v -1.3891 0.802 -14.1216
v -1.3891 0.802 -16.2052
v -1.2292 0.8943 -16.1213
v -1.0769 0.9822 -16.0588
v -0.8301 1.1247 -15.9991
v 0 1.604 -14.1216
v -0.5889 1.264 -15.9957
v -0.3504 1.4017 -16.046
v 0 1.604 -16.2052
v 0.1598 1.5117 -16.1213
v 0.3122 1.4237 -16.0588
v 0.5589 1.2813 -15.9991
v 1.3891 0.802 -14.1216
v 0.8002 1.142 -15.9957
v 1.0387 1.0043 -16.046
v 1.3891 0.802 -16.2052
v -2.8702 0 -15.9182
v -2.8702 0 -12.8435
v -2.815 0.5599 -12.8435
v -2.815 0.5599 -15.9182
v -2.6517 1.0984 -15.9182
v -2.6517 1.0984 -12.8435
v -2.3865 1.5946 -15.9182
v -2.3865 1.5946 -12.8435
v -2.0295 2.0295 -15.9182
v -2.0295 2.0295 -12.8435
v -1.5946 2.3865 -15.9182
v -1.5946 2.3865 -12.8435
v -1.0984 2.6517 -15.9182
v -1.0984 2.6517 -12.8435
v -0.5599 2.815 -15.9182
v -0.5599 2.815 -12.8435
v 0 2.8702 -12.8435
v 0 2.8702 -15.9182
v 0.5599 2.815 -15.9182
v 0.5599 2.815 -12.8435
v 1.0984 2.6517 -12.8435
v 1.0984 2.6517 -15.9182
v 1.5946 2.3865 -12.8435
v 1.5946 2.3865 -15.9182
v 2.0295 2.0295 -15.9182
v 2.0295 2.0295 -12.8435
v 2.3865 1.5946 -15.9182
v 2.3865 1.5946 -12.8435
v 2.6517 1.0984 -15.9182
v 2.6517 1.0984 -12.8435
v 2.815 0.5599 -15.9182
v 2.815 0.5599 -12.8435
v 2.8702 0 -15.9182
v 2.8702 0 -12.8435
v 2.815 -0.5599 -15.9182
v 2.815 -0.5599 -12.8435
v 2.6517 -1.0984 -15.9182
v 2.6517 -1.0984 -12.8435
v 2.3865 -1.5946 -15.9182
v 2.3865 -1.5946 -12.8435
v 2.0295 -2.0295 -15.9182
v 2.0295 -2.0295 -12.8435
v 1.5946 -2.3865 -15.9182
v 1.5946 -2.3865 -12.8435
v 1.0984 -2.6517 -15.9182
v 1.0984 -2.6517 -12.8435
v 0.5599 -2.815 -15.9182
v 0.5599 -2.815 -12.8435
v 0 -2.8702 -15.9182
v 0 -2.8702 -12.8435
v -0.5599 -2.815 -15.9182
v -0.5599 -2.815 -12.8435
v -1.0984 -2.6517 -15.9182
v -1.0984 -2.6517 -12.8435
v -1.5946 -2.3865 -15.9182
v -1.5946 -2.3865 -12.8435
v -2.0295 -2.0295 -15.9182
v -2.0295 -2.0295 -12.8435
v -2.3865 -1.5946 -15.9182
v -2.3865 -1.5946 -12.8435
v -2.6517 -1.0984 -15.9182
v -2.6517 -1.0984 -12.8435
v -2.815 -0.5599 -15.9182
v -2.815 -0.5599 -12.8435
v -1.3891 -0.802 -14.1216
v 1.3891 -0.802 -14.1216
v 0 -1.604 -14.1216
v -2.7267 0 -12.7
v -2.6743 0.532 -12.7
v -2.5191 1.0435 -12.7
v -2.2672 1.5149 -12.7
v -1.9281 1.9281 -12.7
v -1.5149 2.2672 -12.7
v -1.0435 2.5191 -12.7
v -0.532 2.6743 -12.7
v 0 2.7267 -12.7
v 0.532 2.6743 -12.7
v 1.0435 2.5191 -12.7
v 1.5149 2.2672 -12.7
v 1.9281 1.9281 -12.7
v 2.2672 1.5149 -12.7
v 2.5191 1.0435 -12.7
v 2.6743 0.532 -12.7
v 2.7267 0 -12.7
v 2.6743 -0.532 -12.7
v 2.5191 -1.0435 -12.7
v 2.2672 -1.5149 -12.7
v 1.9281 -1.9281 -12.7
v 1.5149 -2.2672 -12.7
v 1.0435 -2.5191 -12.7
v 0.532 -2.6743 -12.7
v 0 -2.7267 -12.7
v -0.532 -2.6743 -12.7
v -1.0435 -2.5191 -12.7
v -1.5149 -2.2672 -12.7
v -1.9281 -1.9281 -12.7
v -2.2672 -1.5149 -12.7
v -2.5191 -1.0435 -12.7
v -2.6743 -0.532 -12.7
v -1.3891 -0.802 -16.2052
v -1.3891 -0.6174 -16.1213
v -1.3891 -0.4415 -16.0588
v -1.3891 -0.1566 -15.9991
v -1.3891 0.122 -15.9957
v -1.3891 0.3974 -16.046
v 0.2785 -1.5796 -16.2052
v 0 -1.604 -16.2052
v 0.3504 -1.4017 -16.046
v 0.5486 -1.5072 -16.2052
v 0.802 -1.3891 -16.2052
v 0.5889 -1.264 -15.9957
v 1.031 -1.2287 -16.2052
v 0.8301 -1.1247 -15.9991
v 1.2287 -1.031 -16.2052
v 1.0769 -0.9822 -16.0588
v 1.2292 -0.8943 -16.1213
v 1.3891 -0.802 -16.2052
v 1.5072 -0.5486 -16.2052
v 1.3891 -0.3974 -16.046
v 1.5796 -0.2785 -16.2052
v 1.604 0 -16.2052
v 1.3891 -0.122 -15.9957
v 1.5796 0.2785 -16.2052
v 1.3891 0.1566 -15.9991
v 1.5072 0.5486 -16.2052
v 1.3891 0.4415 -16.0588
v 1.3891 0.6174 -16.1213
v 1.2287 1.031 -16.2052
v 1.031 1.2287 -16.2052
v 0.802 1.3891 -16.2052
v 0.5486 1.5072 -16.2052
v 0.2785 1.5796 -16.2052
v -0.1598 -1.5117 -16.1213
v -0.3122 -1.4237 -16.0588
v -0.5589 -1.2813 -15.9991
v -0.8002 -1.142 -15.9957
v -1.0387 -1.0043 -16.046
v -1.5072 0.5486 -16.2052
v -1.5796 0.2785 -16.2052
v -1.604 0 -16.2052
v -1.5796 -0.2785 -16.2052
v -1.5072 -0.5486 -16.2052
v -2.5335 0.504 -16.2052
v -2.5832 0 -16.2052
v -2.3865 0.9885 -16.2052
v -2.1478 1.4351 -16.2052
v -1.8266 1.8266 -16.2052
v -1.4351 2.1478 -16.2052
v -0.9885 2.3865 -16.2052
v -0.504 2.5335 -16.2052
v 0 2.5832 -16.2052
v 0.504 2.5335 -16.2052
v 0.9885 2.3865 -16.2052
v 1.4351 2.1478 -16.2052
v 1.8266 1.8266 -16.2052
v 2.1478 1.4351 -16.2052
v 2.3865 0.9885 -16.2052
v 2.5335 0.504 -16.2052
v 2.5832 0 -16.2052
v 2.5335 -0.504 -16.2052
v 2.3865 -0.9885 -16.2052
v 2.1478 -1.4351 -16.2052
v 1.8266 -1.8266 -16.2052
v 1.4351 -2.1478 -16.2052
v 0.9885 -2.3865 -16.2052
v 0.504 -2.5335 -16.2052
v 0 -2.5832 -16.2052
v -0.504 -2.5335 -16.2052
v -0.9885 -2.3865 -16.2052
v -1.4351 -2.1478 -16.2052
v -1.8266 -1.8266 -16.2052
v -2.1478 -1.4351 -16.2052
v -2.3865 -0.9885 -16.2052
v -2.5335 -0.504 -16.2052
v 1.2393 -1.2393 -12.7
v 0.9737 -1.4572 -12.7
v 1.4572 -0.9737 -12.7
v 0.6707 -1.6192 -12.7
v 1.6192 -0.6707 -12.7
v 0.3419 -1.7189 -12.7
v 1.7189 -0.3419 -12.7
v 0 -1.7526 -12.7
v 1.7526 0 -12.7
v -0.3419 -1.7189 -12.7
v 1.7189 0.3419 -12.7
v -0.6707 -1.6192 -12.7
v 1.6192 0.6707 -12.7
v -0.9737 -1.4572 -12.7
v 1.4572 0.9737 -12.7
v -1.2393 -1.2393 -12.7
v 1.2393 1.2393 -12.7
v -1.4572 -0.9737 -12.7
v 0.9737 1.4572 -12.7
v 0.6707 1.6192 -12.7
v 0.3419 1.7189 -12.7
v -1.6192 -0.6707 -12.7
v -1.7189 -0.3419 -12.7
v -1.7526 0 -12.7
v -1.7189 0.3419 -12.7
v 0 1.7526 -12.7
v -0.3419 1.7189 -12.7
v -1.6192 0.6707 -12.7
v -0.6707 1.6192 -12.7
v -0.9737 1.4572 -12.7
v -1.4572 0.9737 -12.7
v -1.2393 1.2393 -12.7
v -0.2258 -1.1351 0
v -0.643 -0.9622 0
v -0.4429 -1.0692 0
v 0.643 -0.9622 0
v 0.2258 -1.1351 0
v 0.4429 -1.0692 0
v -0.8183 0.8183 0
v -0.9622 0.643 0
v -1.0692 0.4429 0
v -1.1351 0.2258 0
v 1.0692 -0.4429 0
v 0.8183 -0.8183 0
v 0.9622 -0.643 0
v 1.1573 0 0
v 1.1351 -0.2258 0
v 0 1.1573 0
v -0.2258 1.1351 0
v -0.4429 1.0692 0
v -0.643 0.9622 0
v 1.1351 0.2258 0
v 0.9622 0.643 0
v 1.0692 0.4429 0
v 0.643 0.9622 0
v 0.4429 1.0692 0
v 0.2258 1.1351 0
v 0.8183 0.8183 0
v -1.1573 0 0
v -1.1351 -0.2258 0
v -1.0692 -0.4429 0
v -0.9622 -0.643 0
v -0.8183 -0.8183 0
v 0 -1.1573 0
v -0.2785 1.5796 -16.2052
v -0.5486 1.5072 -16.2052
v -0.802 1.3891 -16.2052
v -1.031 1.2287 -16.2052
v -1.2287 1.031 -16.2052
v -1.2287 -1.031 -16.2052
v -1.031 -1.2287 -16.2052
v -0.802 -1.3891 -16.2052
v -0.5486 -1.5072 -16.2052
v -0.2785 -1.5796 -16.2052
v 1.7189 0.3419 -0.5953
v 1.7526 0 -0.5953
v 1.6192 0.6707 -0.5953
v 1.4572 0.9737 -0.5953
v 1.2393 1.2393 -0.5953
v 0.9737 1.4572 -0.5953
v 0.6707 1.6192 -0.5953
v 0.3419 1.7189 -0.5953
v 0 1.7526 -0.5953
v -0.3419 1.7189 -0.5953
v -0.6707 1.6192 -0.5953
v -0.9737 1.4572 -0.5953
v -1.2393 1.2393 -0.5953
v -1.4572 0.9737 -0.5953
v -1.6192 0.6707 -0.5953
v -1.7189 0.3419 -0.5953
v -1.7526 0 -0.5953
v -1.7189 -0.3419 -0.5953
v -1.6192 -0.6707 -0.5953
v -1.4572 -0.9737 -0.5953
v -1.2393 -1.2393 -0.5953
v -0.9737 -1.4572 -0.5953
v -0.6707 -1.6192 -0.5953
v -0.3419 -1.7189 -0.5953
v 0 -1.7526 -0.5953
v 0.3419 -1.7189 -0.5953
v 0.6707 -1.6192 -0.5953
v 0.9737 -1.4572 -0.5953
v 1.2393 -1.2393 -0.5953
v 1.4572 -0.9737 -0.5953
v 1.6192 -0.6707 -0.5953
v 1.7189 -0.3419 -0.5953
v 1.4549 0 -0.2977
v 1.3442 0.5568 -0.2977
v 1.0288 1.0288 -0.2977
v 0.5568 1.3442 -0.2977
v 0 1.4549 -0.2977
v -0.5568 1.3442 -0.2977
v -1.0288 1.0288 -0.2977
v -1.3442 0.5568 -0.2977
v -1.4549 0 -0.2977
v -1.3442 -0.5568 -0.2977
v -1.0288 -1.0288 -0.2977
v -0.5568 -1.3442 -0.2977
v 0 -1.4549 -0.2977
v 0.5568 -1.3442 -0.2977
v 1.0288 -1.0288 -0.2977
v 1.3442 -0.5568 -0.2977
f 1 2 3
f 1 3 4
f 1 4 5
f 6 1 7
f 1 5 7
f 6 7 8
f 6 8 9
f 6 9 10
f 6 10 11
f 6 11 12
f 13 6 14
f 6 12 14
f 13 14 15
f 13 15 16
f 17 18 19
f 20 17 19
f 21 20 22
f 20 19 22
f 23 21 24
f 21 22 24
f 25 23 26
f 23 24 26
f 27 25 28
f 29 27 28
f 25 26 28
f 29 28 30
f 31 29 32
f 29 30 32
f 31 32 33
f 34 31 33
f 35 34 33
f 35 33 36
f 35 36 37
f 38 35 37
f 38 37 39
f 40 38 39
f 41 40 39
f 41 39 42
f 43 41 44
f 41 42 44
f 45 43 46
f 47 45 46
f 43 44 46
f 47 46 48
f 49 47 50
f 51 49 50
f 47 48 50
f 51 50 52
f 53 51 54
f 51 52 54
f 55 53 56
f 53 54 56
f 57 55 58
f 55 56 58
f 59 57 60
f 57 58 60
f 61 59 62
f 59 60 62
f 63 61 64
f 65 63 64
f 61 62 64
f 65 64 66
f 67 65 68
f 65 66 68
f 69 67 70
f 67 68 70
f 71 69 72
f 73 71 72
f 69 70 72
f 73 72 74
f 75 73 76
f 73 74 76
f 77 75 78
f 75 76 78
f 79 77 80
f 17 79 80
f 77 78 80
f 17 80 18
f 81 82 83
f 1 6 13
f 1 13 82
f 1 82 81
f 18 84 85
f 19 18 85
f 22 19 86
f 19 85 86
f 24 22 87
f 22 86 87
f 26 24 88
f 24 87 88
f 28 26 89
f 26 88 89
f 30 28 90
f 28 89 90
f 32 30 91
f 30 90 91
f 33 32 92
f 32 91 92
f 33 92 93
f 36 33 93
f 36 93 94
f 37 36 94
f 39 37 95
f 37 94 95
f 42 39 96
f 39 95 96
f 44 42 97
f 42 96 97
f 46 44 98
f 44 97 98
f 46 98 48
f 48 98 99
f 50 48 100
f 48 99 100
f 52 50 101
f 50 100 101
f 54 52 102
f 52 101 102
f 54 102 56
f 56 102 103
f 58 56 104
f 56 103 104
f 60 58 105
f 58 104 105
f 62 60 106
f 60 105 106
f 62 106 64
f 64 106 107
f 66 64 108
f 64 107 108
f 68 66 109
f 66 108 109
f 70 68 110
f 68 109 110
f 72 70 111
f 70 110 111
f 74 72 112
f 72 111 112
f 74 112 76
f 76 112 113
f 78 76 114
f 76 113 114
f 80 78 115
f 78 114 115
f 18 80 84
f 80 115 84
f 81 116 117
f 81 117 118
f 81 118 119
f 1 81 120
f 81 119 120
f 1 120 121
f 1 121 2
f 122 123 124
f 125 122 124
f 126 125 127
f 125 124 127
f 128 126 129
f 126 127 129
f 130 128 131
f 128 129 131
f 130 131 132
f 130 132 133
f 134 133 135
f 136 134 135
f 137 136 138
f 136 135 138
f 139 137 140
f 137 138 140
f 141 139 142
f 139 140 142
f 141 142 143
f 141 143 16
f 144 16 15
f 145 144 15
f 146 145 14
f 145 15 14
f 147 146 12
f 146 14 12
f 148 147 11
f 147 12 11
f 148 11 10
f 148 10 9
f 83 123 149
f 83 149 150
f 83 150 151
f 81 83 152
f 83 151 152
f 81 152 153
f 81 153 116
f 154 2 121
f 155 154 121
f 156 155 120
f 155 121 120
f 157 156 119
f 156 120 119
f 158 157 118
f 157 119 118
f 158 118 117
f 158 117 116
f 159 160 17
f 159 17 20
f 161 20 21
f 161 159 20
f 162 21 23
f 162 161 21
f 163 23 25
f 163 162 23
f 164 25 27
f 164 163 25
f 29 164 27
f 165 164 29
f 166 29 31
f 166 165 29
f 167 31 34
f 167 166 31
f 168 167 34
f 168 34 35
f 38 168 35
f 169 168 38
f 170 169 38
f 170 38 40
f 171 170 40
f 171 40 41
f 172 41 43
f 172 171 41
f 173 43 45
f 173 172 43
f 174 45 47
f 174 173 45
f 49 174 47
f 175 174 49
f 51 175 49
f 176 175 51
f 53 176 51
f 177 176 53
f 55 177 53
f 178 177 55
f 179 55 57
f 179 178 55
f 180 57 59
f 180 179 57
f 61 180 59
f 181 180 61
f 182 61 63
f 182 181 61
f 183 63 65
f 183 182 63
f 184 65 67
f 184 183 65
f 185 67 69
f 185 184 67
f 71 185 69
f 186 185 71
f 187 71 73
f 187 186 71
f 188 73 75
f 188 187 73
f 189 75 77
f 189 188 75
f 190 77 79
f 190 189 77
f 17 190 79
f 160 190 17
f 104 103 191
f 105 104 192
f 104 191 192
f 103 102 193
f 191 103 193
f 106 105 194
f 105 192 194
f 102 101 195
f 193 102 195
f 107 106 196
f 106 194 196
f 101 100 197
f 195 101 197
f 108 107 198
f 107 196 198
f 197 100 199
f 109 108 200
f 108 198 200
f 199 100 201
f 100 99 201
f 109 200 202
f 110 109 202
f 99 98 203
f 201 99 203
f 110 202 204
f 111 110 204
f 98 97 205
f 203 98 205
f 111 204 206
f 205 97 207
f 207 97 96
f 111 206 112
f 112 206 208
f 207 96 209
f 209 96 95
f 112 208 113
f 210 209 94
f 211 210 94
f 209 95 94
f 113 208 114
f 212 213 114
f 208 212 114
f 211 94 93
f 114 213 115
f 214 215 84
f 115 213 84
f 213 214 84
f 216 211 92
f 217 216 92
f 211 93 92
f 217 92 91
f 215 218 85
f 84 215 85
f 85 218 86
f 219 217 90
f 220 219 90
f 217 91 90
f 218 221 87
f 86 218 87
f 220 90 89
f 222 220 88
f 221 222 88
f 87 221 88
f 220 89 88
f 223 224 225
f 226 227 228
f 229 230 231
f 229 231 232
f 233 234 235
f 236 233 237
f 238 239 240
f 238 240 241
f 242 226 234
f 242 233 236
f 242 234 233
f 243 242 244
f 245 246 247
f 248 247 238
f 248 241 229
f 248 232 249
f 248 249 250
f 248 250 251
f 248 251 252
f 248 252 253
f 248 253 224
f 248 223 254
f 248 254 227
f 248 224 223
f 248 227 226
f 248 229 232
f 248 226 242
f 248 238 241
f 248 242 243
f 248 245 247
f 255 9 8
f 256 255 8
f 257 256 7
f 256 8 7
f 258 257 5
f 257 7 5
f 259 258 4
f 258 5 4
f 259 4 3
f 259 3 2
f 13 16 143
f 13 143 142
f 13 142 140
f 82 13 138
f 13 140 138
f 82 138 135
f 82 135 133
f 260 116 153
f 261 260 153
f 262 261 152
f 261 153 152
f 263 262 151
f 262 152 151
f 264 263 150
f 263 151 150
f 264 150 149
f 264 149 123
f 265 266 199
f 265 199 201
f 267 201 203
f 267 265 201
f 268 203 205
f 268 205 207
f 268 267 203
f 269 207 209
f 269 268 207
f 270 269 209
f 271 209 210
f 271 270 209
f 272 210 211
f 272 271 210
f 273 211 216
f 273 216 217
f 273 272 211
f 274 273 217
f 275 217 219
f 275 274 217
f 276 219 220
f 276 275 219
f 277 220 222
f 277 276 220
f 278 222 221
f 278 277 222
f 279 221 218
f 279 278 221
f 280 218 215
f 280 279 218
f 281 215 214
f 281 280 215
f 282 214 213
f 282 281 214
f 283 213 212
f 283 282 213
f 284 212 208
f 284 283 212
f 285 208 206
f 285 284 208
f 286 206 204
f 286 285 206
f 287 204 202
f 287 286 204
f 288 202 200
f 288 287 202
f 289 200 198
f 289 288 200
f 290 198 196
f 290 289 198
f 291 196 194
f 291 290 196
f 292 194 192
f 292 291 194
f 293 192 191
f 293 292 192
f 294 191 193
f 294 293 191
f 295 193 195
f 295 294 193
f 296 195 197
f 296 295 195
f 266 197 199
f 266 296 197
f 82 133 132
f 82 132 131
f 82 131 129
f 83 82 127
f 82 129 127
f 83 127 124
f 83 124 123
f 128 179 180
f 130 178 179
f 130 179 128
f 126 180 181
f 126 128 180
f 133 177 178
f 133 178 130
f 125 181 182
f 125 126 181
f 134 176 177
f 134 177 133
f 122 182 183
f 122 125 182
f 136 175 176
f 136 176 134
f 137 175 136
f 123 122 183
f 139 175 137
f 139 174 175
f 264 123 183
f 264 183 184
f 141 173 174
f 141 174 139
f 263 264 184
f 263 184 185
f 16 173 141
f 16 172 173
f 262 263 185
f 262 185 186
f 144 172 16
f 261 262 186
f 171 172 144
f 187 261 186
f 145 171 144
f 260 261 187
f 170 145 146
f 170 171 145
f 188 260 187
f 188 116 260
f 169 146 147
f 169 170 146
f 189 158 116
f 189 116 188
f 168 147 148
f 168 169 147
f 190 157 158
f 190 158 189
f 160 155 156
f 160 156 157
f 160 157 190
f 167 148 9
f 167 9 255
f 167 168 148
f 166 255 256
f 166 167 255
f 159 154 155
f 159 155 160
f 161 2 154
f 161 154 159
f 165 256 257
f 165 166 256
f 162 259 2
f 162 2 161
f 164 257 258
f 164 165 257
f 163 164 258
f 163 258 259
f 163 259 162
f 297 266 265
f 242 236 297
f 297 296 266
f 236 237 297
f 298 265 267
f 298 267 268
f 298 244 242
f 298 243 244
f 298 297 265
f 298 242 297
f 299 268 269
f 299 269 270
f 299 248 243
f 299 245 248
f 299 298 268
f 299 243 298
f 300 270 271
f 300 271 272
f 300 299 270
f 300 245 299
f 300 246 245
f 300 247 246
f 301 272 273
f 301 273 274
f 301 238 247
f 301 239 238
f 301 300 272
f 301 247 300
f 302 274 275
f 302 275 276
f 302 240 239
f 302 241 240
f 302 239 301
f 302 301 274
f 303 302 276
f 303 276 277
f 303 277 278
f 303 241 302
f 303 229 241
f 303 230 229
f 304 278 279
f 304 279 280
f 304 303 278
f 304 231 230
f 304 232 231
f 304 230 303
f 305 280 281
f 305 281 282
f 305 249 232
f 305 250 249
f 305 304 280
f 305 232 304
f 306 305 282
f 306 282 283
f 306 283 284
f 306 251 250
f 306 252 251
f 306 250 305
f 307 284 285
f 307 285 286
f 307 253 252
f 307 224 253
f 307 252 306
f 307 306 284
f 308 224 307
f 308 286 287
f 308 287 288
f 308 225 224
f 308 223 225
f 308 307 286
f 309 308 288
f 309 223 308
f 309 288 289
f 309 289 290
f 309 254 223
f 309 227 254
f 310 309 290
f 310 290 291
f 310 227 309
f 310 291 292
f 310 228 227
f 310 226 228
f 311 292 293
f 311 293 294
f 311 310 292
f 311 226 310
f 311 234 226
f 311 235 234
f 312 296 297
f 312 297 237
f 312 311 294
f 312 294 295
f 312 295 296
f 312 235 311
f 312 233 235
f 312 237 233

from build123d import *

# Parameters (mm, degrees)
SKETCH1_R          = 1.7526
EXTRUDE1_DEPTH     = 12.7
CHAMFER3_SIZE      = 0.5953125
SKETCH6_R          = 2.8702
EXTRUDE2_DEPTH     = 3.5052
CUT_EXTRUDE1_DEPTH = 2.08359375
CHAMFER1_SIZE      = 0.28702
CHAMFER2_SIZE      = 0.14351


with BuildPart() as part:
    # Sketch1 → Extrude1 (new body)
    with BuildSketch(Plane.XY):
        Circle(SKETCH1_R)
    extrude(amount=-EXTRUDE1_DEPTH)

    # Chamfer3
    chamfer3_edges = [part.edges().sort_by_distance(p)[0] for p in [
        (-1.7526, 0, 0),
    ]]
    chamfer(chamfer3_edges, length=CHAMFER3_SIZE)

    # Sketch6 → Extrude2 (add)
    with BuildSketch(Plane(origin=(0, 0, -12.7), x_dir=(-1, 0, 0), z_dir=(0, 0, -1))):
        Circle(SKETCH6_R)
    extrude(amount=EXTRUDE2_DEPTH)

    # Sketch7 → Cut-Extrude1 (cut)
    with BuildSketch(Plane(origin=(0, 0, -16.2052), x_dir=(-1, 0, 0), z_dir=(0, 0, -1))):
        Polygon((0, 1.603951217), (-1.3890625, 0.801975608), (-1.3890625, -0.801975608), (0, -1.603951217), (1.3890625, -0.801975608), (1.3890625, 0.801975608), align=None)
    extrude(amount=-CUT_EXTRUDE1_DEPTH, mode=Mode.SUBTRACT)

    # Cut-Extrude2 cone 1 section (through the dimple's axis) → Cut-Extrude2 (revolve, cut)
    with BuildSketch(Plane(origin=(0, 0, -16.2052), x_dir=(0, 1, 0), z_dir=(1, 0, 0))):
        Polygon((0, 0), (1.603951217, 0), (0, 1.603951217), align=None)
    revolve(axis=Axis((0, 0, -16.2052), (0, 0, 1)), mode=Mode.SUBTRACT)

    # Chamfer1
    chamfer1_edges = [part.edges().sort_by_distance(p)[0] for p in [
        (2.8702, 0, -16.2052),
    ]]
    chamfer(chamfer1_edges, length=CHAMFER1_SIZE)

    # Chamfer2
    chamfer2_edges = [part.edges().sort_by_distance(p)[0] for p in [
        (2.8702, 0, -12.7),
    ]]
    chamfer(chamfer2_edges, length=CHAMFER2_SIZE)


solid = part.part
